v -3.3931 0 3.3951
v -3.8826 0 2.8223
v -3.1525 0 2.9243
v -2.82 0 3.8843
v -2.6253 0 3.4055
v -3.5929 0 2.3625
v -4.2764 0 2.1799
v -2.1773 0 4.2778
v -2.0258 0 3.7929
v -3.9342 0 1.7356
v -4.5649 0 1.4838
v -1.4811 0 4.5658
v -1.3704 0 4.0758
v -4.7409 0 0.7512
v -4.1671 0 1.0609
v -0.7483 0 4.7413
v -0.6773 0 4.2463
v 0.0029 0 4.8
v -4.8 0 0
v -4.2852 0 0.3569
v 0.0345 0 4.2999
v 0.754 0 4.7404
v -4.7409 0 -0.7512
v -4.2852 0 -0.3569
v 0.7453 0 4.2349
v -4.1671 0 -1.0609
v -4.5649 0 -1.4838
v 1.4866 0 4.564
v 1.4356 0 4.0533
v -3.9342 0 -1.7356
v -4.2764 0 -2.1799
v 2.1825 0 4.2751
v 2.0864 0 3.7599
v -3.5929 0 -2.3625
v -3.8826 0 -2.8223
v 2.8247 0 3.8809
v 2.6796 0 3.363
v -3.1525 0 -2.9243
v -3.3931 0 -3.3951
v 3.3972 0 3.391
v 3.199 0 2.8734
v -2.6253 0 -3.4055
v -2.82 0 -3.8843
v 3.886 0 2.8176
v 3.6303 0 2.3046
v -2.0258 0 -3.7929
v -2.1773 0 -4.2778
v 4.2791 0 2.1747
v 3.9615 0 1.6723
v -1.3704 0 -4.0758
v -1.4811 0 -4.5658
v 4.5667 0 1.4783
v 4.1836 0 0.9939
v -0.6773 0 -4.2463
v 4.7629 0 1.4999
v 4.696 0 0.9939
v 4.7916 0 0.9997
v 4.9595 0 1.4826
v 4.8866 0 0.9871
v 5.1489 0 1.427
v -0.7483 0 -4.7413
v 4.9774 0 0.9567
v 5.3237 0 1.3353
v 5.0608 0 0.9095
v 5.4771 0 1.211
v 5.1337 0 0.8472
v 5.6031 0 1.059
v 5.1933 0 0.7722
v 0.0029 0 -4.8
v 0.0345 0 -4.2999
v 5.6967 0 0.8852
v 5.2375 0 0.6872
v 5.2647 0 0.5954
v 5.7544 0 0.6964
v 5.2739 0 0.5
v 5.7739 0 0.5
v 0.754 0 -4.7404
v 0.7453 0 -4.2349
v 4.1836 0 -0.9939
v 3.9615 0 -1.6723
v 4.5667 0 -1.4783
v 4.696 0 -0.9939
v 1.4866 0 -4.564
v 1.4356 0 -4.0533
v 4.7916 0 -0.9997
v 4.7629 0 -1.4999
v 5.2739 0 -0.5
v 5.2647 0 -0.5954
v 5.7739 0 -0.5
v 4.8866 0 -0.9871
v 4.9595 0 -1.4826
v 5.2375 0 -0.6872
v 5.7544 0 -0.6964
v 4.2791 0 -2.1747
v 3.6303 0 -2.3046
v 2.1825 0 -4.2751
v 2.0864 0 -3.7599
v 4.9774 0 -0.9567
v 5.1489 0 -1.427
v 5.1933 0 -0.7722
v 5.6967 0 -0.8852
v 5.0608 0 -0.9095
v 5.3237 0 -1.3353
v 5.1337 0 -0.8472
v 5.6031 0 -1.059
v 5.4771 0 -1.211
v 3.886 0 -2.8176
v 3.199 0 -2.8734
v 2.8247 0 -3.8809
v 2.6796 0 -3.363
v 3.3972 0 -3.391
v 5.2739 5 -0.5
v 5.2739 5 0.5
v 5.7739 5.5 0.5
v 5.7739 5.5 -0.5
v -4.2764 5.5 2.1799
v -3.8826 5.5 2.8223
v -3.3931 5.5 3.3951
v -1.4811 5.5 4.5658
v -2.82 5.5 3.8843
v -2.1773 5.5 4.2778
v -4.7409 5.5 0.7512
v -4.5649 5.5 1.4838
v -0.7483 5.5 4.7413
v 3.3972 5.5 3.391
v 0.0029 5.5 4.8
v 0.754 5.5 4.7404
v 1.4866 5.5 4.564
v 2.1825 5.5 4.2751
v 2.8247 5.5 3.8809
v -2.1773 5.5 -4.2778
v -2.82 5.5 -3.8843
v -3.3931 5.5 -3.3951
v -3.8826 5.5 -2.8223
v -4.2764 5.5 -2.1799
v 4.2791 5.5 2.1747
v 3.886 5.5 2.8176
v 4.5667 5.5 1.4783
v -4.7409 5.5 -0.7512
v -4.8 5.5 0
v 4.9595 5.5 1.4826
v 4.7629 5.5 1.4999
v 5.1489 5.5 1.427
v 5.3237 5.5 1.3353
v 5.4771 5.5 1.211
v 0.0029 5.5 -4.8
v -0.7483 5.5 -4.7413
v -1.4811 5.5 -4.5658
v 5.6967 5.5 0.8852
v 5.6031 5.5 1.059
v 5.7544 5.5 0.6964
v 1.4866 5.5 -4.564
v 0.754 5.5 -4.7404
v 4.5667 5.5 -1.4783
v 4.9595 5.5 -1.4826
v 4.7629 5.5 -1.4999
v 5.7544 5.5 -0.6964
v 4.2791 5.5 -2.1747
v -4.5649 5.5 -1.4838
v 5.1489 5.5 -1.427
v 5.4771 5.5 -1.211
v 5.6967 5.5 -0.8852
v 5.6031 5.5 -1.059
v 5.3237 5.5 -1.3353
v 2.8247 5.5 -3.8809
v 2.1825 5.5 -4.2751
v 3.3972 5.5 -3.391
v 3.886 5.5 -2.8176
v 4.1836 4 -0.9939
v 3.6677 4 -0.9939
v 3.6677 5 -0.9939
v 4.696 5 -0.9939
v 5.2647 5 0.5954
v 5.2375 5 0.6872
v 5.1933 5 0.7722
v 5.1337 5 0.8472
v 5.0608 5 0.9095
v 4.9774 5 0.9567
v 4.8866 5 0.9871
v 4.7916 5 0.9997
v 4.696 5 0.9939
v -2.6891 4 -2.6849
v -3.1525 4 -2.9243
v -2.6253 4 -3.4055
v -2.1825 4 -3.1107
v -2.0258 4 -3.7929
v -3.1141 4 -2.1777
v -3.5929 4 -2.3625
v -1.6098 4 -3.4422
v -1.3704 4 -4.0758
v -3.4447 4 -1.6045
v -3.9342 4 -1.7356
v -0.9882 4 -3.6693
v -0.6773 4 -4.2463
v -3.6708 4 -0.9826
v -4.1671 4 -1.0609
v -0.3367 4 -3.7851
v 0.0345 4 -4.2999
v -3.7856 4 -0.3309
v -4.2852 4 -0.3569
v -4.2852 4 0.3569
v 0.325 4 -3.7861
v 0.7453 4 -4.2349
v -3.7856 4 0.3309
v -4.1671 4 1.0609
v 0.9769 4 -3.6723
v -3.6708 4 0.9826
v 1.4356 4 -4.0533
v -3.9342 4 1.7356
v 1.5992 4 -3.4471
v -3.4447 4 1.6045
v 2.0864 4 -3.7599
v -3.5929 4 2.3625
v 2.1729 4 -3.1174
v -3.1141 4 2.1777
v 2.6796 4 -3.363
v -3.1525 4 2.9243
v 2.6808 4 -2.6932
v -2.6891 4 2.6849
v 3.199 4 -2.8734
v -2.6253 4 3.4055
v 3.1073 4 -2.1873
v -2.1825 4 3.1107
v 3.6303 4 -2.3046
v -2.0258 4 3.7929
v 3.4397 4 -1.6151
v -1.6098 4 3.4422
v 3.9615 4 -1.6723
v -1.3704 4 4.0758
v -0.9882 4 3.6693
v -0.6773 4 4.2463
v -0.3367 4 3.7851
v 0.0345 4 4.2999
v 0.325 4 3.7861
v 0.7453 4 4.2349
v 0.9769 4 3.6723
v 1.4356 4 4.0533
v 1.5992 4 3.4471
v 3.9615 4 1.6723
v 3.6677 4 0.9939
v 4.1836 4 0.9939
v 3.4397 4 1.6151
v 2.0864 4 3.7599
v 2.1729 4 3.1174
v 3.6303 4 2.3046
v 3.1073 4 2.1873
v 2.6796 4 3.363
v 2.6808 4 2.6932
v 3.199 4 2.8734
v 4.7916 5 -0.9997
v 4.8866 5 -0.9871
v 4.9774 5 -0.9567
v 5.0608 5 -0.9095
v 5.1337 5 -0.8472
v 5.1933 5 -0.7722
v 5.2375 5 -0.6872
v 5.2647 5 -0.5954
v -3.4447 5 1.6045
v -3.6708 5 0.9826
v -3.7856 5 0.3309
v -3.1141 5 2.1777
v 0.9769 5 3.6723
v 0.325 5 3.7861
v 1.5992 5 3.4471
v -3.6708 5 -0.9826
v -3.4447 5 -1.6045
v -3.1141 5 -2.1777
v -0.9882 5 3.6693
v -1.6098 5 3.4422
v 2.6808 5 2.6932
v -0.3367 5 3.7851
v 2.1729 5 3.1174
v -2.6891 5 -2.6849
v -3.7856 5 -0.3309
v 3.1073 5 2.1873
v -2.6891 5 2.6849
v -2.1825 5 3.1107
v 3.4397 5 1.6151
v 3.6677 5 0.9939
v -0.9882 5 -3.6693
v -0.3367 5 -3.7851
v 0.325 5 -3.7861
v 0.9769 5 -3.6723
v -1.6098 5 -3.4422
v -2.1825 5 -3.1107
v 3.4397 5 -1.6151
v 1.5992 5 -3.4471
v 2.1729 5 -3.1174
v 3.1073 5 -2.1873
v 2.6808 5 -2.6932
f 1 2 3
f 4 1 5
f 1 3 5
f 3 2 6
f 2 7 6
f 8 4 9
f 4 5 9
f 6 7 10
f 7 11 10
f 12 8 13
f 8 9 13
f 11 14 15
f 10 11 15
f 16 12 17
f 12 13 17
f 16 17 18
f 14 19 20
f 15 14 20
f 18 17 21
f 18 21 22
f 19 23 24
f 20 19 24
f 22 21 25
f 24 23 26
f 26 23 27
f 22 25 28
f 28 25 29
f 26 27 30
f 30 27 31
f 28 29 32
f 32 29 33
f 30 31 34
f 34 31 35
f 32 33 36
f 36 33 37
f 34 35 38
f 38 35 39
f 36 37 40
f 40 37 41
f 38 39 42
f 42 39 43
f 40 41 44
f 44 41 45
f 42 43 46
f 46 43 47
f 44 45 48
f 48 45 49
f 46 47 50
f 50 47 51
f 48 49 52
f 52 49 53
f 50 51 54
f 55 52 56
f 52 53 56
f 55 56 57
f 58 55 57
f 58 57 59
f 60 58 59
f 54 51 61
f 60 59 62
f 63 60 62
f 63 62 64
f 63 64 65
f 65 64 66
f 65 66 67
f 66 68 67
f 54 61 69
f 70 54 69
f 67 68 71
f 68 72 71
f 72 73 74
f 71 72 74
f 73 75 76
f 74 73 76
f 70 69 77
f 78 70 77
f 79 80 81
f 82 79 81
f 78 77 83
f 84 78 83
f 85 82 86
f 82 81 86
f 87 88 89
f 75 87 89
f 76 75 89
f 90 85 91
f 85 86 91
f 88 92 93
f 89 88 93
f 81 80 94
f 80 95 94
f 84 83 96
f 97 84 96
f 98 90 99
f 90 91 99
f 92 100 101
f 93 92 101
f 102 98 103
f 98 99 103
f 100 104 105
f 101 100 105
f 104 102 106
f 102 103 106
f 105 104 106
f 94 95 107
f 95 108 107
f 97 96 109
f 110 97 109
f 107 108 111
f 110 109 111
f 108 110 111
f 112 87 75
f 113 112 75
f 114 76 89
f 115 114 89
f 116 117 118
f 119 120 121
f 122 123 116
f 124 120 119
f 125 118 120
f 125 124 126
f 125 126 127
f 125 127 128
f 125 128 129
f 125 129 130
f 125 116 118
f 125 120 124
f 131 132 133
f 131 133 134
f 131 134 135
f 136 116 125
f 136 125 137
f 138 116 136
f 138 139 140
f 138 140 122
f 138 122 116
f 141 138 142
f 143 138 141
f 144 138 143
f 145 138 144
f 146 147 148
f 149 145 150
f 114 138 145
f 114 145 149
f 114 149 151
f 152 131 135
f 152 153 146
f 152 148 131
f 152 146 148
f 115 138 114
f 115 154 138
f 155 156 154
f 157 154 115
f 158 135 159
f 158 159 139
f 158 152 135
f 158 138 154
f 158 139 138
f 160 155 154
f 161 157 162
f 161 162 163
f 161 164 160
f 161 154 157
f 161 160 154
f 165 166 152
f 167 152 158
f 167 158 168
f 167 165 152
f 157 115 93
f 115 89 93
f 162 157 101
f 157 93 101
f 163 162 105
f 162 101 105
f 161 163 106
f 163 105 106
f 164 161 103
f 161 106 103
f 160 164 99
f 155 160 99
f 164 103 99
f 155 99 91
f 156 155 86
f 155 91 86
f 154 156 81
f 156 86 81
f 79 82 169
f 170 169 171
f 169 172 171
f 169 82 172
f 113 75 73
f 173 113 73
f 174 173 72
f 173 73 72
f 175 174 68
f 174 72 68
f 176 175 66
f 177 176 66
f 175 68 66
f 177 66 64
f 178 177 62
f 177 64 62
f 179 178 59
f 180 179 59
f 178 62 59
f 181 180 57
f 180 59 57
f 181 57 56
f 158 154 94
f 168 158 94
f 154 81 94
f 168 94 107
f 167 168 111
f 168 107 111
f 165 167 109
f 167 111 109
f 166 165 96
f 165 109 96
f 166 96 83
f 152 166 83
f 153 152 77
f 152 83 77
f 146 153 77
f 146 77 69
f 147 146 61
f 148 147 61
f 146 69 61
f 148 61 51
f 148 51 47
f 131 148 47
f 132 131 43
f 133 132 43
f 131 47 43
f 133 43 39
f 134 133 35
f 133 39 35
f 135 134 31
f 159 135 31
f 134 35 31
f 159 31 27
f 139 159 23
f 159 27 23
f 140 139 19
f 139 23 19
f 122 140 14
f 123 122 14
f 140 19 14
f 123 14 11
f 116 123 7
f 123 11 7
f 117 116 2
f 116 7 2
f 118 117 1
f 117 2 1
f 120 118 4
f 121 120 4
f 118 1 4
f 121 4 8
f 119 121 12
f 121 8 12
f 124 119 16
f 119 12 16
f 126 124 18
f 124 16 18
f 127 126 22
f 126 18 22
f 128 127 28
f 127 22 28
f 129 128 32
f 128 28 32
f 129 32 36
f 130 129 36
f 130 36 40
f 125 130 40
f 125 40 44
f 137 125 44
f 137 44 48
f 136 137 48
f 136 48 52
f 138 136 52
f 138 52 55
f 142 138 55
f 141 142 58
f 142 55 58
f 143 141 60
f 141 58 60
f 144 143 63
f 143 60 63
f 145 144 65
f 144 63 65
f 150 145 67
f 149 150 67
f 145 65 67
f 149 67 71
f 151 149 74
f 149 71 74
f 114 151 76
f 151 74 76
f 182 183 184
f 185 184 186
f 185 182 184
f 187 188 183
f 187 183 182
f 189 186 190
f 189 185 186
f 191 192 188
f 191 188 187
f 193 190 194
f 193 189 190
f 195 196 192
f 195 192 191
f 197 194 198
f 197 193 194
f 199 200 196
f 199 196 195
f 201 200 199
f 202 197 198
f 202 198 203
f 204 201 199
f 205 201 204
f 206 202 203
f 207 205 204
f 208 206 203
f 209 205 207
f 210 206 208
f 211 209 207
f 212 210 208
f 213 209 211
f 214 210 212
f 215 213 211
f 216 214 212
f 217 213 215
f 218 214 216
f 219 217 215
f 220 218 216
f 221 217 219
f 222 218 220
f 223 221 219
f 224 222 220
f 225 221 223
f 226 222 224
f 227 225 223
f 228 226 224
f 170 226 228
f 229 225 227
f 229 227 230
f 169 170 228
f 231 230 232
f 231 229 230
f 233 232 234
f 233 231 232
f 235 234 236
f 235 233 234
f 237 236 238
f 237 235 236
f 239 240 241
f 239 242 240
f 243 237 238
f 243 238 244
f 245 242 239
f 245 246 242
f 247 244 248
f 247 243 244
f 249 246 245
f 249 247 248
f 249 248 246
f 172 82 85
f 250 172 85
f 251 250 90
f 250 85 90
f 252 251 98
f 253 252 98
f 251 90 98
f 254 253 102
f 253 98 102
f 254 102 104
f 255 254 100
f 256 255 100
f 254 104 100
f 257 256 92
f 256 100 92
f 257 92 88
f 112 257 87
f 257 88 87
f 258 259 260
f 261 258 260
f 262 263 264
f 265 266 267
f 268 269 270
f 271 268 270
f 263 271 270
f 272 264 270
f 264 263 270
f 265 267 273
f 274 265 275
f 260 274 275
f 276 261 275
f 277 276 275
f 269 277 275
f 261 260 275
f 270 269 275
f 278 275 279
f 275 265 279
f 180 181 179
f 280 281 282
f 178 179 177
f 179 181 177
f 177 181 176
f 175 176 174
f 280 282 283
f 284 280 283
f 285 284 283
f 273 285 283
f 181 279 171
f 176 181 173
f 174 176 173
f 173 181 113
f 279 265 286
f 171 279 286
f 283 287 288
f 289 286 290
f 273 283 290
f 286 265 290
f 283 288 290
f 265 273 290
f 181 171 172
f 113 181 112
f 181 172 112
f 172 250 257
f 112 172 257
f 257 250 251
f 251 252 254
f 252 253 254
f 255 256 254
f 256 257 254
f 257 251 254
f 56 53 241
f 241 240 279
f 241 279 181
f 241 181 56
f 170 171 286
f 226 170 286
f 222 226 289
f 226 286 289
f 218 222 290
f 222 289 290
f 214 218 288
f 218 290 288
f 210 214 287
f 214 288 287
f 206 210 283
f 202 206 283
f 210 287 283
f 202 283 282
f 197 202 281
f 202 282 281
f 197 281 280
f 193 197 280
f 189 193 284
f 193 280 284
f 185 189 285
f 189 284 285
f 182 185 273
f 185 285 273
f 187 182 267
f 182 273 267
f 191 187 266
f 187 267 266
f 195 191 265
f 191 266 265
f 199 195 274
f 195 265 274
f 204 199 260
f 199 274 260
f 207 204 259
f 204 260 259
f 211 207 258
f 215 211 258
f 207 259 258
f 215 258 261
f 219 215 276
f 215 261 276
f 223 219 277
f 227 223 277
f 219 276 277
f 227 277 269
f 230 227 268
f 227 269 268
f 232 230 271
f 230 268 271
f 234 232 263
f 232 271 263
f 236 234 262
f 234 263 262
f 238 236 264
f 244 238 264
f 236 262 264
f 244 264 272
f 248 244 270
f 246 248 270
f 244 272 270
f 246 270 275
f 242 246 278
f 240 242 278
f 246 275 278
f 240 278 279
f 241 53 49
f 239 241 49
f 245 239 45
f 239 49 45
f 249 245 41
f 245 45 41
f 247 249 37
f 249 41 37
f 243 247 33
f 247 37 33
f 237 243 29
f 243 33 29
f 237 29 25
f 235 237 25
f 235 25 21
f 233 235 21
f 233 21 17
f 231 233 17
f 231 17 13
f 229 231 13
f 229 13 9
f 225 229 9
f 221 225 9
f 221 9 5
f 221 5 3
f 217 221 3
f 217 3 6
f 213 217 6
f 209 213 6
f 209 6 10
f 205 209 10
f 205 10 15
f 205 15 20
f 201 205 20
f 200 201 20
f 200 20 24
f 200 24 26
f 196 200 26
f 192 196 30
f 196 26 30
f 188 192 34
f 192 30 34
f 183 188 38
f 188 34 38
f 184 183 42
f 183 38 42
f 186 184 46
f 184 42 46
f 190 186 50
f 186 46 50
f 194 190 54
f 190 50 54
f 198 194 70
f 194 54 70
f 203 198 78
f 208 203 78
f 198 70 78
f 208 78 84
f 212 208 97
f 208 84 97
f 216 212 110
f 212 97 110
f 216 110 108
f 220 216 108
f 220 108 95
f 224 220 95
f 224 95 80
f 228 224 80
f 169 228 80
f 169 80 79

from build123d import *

# Parameters (mm, degrees)
BOSS_EXTRUDE1_DEPTH = 5
BOSS_EXTRUDE2_DEPTH = 0.5
BOSS_EXTRUDE3_DEPTH = 1


with BuildPart() as part:
    # Sketch1 → Boss-Extrude1 (new body)
    with BuildSketch(Plane(origin=(0, 0, 0), x_dir=(1, 0, 0), z_dir=(0, 1, 0))):
        with BuildLine():
            ThreePointArc((4.566687335, 1.478298611), (-4.8, 0), (4.566687335, -1.478298611))
            ThreePointArc((4.566687335, -1.478298611), (5.403490366, -1.276916974), (5.773887305, -0.5))
            Line((5.773887305, -0.5), (5.773887305, 0.5))
            ThreePointArc((5.773887305, 0.5), (5.403490366, 1.276916974), (4.566687335, 1.478298611))
        make_face()
        with BuildLine():
            ThreePointArc((5.273887305, -0.5), (5.098728559, -0.880102828), (4.695974666, -0.993892317))
            Line((4.695974666, -0.993892317), (4.183560453, -0.993892317))
            ThreePointArc((4.183560453, -0.993892317), (-4.3, 0), (4.183560453, 0.993892317))
            Line((4.183560453, 0.993892317), (4.695974666, 0.993892317))
            ThreePointArc((4.695974666, 0.993892317), (5.098728559, 0.880102828), (5.273887305, 0.5))
            Line((5.273887305, 0.5), (5.273887305, -0.5))
        make_face(mode=Mode.SUBTRACT)
    extrude(amount=BOSS_EXTRUDE1_DEPTH)

    # Sketch3 → Boss-Extrude2 (add)
    with BuildSketch(Plane(origin=(0, 5, 0), x_dir=(1, 0, 0), z_dir=(0, 1, 0))):
        with BuildLine():
            Line((5.773887305, -0.5), (5.773887305, 0.5))
            ThreePointArc((5.773887305, 0.5), (5.403490366, 1.276916974), (4.566687335, 1.478298611))
            ThreePointArc((4.566687335, 1.478298611), (-4.8, 0), (4.566687335, -1.478298611))
            ThreePointArc((4.566687335, -1.478298611), (5.403490366, -1.276916974), (5.773887305, -0.5))
        make_face()
    extrude(amount=BOSS_EXTRUDE2_DEPTH)

    # Sketch4 → Boss-Extrude3 (add)
    with BuildSketch(Plane.XZ.offset(-5)):
        with BuildLine():
            Line((3.667721099, 0.993892317), (4.183560453, 0.993892317))
            ThreePointArc((4.183560453, 0.993892317), (-4.3, 0), (4.183560453, -0.993892317))
            Line((4.183560453, -0.993892317), (3.667721099, -0.993892317))
            ThreePointArc((3.667721099, -0.993892317), (-3.8, 0), (3.667721099, 0.993892317))
        make_face()
    extrude(amount=BOSS_EXTRUDE3_DEPTH)


solid = part.part
